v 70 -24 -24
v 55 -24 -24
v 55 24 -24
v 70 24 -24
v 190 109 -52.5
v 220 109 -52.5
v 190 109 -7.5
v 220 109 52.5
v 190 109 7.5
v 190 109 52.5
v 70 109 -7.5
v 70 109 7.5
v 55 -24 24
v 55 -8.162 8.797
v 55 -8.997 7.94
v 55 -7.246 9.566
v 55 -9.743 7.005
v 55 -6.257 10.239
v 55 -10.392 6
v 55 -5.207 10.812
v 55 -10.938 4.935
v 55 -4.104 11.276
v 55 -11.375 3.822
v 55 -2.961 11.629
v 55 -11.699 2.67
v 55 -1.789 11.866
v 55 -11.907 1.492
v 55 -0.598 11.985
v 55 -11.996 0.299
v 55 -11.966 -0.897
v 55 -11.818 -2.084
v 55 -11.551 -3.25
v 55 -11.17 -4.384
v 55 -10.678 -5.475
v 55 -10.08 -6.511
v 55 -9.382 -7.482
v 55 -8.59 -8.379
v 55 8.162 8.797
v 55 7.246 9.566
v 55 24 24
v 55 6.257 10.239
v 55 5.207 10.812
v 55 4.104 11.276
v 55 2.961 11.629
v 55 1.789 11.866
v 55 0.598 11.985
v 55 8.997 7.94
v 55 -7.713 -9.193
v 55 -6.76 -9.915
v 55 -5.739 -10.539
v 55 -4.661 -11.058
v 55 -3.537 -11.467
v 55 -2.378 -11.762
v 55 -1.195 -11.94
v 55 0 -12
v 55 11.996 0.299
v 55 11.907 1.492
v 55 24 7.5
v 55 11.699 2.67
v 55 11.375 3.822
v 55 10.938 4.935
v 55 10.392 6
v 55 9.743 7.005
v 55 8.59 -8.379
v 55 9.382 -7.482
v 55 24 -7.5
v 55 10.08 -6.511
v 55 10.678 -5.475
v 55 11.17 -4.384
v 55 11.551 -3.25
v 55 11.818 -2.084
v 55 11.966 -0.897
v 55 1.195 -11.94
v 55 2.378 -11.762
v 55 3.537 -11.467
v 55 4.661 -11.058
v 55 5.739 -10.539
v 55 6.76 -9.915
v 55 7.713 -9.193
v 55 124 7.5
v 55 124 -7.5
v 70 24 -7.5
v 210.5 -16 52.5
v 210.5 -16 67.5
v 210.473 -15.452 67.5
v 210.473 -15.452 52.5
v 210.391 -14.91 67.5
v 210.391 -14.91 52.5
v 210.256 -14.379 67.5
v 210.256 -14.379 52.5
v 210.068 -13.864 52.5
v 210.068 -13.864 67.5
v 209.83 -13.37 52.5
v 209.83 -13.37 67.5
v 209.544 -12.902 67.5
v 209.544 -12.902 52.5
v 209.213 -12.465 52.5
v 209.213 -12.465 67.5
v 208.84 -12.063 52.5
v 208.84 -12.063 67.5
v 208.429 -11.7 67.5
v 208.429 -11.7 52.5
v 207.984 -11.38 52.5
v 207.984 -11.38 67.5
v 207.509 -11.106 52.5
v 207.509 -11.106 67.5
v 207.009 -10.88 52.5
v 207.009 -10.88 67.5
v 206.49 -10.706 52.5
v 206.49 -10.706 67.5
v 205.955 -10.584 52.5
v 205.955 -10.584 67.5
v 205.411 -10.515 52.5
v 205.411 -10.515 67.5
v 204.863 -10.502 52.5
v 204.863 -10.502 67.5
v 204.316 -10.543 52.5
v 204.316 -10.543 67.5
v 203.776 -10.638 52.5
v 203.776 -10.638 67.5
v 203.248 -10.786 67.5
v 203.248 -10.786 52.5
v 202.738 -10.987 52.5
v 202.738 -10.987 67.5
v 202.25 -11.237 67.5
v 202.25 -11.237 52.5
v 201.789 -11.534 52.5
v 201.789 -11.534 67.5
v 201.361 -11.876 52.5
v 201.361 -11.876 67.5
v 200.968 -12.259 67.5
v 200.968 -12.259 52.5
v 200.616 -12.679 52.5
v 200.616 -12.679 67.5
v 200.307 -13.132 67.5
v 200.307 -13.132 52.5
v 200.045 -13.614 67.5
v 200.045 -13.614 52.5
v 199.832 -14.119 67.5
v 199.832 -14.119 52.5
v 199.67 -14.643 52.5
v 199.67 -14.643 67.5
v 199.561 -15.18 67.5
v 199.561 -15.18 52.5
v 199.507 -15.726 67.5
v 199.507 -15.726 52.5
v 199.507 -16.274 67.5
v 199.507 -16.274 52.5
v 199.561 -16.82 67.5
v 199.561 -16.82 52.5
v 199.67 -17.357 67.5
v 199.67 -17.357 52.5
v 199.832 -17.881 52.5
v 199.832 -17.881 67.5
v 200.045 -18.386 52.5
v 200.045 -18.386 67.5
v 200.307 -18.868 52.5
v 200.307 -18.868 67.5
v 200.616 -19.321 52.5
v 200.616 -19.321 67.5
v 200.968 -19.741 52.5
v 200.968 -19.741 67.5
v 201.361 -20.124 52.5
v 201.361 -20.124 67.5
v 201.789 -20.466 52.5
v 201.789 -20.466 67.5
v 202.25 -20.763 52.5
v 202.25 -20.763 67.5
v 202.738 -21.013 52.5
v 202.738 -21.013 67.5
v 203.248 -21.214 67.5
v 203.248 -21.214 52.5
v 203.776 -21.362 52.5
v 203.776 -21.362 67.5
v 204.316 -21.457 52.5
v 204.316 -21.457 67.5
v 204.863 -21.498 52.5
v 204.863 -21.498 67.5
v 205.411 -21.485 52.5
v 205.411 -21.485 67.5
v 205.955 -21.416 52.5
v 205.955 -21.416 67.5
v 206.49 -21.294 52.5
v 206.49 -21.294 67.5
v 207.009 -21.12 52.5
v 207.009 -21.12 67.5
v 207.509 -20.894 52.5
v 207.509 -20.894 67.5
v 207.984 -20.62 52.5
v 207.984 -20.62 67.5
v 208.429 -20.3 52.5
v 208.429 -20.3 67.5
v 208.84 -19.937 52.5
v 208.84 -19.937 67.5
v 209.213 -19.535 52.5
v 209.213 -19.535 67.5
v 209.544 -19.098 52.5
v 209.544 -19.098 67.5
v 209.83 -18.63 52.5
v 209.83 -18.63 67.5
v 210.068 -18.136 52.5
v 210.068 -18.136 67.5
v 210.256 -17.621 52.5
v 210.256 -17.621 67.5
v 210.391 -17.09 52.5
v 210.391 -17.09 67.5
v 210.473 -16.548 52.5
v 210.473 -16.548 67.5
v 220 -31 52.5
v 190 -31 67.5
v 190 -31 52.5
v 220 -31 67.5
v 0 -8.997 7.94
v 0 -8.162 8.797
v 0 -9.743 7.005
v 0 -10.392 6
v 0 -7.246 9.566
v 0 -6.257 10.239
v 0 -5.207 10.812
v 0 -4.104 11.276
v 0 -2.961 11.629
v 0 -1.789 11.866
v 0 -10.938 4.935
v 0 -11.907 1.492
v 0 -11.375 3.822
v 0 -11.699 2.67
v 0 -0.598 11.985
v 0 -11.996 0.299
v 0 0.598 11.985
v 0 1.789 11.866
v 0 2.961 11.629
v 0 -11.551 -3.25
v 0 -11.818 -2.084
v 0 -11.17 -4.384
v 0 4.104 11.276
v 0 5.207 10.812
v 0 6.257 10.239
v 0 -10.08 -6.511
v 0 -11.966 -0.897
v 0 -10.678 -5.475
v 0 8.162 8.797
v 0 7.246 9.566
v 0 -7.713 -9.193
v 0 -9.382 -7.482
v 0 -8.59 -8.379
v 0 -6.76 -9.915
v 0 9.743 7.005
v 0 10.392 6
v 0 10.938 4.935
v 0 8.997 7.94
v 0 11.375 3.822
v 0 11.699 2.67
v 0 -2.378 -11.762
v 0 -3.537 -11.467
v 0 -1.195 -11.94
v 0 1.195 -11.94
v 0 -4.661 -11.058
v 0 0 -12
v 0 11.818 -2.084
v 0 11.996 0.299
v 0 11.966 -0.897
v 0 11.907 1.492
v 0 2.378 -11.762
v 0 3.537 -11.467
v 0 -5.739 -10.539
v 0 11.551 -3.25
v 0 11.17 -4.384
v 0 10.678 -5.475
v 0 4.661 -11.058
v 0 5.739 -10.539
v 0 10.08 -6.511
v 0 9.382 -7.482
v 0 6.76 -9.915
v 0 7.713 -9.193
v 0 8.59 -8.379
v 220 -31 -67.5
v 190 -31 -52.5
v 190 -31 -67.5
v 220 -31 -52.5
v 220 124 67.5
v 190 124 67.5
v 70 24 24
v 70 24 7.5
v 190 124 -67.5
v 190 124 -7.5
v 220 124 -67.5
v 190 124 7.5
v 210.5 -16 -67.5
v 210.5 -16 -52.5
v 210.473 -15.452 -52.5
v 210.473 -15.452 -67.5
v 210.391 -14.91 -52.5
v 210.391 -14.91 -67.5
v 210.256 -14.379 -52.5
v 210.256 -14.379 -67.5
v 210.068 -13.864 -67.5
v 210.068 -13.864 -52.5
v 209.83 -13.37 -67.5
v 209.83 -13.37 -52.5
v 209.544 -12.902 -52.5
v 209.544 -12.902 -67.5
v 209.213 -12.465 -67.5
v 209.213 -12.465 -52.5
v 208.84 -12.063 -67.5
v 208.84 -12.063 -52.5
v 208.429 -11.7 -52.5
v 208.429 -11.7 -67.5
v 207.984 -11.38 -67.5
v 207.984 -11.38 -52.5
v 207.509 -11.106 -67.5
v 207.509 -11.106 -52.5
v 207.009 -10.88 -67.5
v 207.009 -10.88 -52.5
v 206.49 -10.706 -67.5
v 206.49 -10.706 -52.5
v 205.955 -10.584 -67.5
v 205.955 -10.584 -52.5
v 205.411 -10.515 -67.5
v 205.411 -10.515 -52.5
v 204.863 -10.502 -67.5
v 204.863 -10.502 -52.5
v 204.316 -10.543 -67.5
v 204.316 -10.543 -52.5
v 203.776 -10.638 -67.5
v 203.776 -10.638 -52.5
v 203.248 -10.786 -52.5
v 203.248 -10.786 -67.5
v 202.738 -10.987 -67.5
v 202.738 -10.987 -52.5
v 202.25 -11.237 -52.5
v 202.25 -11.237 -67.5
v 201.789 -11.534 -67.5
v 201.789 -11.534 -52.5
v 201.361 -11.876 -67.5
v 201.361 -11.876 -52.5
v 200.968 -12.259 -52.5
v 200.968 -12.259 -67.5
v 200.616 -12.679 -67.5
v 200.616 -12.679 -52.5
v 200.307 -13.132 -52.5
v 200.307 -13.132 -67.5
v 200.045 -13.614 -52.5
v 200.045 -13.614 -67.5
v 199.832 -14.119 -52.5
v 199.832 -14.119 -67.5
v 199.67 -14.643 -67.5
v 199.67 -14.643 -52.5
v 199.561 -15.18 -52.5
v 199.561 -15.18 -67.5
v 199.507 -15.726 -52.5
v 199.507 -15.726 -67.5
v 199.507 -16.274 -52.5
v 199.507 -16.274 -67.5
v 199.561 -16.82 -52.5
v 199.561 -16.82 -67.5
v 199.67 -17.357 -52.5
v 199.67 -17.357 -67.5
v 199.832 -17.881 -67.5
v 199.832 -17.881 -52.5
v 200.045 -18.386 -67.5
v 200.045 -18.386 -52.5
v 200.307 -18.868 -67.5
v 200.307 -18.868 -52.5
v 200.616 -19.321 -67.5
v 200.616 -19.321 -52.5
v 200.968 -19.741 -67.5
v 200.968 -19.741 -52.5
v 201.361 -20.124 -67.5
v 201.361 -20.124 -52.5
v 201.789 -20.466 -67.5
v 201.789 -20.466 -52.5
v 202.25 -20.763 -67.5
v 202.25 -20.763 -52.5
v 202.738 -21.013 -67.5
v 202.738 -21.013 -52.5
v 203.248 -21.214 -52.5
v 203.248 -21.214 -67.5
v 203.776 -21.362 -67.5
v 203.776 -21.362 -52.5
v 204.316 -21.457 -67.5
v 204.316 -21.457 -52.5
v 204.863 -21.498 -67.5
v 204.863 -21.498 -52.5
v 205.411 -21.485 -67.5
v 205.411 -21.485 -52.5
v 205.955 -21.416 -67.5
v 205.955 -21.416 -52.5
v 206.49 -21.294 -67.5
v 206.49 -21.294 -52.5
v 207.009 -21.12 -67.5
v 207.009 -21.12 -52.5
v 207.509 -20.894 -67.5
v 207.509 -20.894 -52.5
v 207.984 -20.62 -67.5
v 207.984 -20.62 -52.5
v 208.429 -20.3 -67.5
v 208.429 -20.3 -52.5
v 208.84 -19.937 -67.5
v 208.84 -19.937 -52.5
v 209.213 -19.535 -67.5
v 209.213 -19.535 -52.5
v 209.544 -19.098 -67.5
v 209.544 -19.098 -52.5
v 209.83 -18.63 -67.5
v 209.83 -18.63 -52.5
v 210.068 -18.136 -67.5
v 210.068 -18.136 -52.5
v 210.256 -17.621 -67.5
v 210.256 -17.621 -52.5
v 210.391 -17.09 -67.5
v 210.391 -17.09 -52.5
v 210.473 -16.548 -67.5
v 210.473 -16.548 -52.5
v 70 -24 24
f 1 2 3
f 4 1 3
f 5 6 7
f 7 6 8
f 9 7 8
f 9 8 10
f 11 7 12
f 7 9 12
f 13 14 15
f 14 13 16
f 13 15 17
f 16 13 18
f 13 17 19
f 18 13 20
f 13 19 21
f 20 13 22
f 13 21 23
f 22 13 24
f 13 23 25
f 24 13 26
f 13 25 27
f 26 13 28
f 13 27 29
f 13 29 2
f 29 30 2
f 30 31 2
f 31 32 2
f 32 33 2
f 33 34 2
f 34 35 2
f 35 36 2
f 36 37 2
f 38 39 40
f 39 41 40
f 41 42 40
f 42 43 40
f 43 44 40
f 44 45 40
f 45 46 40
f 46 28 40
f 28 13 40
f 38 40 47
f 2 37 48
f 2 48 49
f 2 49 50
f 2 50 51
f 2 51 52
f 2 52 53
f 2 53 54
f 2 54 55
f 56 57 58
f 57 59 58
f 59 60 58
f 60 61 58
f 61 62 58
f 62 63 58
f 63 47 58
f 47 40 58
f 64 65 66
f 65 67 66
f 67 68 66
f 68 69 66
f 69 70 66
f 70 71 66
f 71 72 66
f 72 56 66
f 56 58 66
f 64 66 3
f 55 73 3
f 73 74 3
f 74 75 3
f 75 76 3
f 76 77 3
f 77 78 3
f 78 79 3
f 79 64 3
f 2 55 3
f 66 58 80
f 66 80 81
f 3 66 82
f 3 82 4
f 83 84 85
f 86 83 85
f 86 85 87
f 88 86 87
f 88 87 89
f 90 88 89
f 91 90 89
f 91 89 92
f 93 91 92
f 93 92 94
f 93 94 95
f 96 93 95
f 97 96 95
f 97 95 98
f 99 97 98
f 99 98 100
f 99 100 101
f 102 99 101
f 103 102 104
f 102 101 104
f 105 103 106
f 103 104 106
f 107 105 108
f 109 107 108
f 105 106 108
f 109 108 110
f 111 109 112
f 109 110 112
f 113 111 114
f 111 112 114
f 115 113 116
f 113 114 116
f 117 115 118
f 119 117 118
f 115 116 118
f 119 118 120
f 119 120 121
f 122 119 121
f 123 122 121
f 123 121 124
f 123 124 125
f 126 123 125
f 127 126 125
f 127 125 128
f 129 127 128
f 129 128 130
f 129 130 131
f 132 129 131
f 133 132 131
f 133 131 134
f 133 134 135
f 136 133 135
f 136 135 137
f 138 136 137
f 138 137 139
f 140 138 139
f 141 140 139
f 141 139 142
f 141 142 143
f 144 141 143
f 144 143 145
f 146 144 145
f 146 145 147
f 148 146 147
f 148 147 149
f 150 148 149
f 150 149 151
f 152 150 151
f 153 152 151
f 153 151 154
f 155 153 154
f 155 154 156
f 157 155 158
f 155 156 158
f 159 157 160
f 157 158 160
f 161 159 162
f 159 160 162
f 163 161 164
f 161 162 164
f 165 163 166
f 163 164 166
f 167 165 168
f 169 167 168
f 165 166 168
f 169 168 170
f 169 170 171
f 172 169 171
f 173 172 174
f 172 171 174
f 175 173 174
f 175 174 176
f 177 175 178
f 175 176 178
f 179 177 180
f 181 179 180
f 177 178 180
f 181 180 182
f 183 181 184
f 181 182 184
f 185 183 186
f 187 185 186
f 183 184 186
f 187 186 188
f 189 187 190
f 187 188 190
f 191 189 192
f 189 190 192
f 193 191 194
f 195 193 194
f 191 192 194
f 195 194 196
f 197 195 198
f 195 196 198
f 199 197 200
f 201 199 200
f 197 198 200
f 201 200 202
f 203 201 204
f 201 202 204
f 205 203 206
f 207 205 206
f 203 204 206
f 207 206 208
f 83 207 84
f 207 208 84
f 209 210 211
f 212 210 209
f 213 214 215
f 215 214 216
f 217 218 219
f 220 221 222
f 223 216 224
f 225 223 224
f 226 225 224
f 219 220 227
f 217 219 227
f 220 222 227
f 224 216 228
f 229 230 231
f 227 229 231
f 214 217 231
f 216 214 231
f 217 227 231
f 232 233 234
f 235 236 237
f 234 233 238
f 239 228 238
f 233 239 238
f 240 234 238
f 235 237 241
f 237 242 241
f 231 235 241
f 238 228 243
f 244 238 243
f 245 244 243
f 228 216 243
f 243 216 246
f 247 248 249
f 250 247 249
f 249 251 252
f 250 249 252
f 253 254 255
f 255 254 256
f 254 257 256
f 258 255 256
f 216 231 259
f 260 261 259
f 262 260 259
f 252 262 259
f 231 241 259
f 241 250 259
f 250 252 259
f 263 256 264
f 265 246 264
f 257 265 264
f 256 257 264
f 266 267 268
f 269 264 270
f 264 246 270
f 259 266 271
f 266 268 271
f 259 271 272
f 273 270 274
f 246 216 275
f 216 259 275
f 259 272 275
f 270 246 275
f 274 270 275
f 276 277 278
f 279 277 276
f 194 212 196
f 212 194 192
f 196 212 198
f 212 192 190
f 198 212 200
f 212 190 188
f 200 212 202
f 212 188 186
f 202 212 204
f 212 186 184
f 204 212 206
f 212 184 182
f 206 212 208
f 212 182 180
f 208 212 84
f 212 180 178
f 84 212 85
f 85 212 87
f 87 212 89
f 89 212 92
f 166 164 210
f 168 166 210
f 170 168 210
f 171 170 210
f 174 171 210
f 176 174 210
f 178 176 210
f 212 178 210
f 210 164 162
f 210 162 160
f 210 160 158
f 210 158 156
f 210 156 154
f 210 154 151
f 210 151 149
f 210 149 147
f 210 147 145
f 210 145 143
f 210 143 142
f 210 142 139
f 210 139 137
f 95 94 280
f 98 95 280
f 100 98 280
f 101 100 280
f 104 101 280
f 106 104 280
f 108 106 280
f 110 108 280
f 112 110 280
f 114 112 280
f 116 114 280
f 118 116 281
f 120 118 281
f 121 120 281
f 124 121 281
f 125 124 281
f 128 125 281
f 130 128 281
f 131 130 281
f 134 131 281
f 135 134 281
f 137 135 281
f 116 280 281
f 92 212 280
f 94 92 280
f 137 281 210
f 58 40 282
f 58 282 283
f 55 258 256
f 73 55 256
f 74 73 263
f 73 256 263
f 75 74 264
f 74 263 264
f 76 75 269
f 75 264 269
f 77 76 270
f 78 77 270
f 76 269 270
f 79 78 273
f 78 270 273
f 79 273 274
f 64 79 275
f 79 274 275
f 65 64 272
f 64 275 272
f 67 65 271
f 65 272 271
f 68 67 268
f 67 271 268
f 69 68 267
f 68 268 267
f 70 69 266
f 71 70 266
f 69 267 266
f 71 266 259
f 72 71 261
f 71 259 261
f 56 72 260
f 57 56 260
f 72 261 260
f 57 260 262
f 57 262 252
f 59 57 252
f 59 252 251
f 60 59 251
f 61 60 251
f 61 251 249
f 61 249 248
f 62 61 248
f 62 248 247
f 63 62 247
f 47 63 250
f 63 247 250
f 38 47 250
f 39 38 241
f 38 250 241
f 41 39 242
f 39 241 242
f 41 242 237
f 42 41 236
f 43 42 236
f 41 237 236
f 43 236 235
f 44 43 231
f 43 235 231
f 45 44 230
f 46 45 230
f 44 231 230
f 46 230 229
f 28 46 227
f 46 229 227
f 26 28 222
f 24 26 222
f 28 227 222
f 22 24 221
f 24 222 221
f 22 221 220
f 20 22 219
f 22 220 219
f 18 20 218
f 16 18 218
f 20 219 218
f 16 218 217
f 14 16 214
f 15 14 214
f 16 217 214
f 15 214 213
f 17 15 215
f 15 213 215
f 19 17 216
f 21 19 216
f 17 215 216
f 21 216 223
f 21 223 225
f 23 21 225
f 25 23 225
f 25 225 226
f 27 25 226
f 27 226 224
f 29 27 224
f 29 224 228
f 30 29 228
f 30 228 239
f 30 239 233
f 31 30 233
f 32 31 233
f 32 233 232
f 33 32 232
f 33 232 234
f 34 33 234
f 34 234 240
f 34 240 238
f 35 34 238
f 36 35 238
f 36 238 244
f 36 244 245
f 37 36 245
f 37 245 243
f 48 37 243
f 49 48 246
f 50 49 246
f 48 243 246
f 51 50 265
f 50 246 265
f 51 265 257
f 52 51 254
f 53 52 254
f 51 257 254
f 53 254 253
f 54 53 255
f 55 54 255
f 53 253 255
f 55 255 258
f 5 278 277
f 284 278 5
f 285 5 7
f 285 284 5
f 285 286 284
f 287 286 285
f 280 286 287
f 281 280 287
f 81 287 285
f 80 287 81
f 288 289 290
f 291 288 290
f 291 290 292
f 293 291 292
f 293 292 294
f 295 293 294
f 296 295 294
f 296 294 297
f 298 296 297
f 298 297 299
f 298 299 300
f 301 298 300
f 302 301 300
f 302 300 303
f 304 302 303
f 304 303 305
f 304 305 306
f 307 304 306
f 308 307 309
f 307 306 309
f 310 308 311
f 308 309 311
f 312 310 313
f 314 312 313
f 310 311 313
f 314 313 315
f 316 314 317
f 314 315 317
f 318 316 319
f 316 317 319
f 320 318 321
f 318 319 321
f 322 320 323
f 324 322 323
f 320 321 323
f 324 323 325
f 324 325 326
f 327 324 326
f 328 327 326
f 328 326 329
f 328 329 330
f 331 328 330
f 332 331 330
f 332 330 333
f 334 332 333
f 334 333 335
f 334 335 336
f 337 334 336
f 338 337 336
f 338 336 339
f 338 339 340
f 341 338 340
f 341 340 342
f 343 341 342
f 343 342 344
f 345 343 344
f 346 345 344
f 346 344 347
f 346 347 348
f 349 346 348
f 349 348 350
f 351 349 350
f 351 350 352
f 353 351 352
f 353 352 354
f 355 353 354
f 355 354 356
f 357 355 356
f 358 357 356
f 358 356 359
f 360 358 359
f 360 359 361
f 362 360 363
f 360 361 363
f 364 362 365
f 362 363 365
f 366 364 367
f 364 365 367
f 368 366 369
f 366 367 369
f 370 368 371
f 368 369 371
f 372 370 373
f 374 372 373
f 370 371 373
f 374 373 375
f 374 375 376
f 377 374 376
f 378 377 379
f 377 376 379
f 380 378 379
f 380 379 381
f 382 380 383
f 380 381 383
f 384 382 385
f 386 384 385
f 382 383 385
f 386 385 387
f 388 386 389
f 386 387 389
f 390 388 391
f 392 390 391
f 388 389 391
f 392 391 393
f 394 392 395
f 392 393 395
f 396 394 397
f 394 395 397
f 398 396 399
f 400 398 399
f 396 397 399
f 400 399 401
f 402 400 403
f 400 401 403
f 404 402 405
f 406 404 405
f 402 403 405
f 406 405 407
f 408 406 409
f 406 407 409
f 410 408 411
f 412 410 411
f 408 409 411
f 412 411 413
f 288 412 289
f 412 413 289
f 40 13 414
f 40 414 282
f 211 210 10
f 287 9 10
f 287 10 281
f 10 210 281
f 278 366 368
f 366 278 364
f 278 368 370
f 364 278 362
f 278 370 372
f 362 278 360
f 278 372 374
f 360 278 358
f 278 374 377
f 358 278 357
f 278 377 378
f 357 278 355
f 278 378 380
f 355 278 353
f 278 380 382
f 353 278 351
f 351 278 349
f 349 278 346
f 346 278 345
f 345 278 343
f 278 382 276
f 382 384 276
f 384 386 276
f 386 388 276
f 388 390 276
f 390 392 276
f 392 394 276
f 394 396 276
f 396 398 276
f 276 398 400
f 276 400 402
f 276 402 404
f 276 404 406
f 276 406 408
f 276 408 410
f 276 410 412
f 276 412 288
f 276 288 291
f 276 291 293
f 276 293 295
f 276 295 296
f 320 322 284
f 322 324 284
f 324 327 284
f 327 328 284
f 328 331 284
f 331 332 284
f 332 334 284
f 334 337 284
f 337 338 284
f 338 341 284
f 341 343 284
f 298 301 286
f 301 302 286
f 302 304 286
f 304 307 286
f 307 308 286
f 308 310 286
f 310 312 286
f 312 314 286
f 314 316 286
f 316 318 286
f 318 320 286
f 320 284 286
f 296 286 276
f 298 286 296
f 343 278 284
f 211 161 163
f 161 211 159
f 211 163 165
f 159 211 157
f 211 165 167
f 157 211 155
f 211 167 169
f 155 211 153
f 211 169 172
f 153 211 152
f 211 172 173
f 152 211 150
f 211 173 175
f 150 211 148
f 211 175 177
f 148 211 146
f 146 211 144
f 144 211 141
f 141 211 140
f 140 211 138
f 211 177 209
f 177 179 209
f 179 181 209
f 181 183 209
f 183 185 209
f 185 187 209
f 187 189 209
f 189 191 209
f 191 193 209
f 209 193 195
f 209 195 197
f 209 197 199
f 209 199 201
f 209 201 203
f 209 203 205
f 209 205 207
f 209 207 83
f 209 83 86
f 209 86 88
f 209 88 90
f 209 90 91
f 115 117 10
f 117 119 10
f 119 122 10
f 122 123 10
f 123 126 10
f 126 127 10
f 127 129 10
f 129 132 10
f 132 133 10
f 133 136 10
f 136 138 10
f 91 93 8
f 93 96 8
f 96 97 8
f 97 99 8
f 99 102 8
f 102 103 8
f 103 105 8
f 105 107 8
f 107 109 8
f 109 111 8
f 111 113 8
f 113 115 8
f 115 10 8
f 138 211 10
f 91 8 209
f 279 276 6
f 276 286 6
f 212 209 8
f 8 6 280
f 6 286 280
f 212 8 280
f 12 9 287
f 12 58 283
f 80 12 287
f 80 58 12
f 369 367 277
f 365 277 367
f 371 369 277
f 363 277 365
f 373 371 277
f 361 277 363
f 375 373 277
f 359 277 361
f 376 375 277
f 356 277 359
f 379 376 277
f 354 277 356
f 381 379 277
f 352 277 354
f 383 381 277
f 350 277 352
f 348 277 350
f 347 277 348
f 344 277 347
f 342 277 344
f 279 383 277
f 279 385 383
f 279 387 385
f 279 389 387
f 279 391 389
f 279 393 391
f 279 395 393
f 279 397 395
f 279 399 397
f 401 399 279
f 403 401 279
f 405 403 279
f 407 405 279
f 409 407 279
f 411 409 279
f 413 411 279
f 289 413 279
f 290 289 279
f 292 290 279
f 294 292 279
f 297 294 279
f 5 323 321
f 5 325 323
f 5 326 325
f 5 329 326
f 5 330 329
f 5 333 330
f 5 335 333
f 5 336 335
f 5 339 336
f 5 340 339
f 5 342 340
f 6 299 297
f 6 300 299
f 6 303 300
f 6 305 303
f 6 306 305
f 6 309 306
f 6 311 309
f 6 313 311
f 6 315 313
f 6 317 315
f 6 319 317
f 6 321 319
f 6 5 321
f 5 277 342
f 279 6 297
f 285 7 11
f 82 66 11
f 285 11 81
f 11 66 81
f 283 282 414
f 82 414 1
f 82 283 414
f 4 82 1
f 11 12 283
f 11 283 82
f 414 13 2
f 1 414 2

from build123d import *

# Parameters (mm, degrees)
SKETCH1_R                = 12
BOSS_EXTRUDE1_DEPTH      = 55
SKETCH4_W                = 48
SKETCH4_H                = 48
BOSS_EXTRUDE3_DEPTH      = 15
SKETCH5_W                = 15
SKETCH5_H                = 15
BOSS_EXTRUDE4_DEPTH      = 100
SKETCH6_W                = 15
SKETCH6_H                = 15
BOSS_EXTRUDE6_DEPTH      = 150
BOSS_EXTRUDE7_DEPTH      = 60
BOSS_EXTRUDE7_DEPTH_BACK = 75
SKETCH7_W                = 30
SKETCH7_H                = 15
SKETCH8_W                = 30
SKETCH8_H                = 15
BOSS_EXTRUDE8_DEPTH      = 140
SKETCH9_R                = 5.5
CUT_EXTRUDE1_DEPTH       = 287.358167336


with BuildPart() as part:
    # Sketch1 → Boss-Extrude1 (new body)
    with BuildSketch(Plane(origin=(0, 0, 0), x_dir=(0, 0, -1), z_dir=(1, 0, 0))):
        Circle(SKETCH1_R)
    extrude(amount=BOSS_EXTRUDE1_DEPTH)

    # Sketch4 → Boss-Extrude3 (add)
    with BuildSketch(Plane(origin=(55, 0, 0), x_dir=(0, 0, -1), z_dir=(1, 0, 0))):
        Rectangle(SKETCH4_W, SKETCH4_H)
    extrude(amount=BOSS_EXTRUDE3_DEPTH)

    # Sketch5 → Boss-Extrude4 (add)
    with BuildSketch(Plane(origin=(0, 24, 0), x_dir=(1, 0, 0), z_dir=(0, 1, 0))):
        with Locations((62.5, 0)):
            Rectangle(SKETCH5_W, SKETCH5_H)
    extrude(amount=BOSS_EXTRUDE4_DEPTH)

    # Sketch6 → Boss-Extrude6 (add)
    with BuildSketch(Plane(origin=(70, 0, 0), x_dir=(0, 0, -1), z_dir=(1, 0, 0))):
        with Locations((0, 116.5)):
            Rectangle(SKETCH6_W, SKETCH6_H)
    extrude(amount=BOSS_EXTRUDE6_DEPTH)

    # Sketch7 → Boss-Extrude7 (add, two sides: drawn at the far end of the back side and taken through both)
    with BuildSketch(Plane(origin=(0, 0, -7.5), x_dir=(-1, 0, 0), z_dir=(0, 0, -1)).offset(-BOSS_EXTRUDE7_DEPTH_BACK)):
        with Locations((-205, 116.5)):
            Rectangle(SKETCH7_W, SKETCH7_H)
    extrude(amount=BOSS_EXTRUDE7_DEPTH + BOSS_EXTRUDE7_DEPTH_BACK)

    # Sketch8 → Boss-Extrude8 (add)
    with BuildSketch(Plane.XZ.offset(-109)):
        with Locations((205, -60)):
            Rectangle(SKETCH8_W, SKETCH8_H)
        with Locations((205, 60)):
            Rectangle(SKETCH8_W, SKETCH8_H)
    extrude(amount=BOSS_EXTRUDE8_DEPTH)

    # Sketch9 → Cut-Extrude1 (cut, through all)
    with BuildSketch(Plane.XY.offset(67.5)):
        with Locations((205, -16)):
            Circle(SKETCH9_R)
    extrude(amount=-CUT_EXTRUDE1_DEPTH, mode=Mode.SUBTRACT)


solid = part.part
